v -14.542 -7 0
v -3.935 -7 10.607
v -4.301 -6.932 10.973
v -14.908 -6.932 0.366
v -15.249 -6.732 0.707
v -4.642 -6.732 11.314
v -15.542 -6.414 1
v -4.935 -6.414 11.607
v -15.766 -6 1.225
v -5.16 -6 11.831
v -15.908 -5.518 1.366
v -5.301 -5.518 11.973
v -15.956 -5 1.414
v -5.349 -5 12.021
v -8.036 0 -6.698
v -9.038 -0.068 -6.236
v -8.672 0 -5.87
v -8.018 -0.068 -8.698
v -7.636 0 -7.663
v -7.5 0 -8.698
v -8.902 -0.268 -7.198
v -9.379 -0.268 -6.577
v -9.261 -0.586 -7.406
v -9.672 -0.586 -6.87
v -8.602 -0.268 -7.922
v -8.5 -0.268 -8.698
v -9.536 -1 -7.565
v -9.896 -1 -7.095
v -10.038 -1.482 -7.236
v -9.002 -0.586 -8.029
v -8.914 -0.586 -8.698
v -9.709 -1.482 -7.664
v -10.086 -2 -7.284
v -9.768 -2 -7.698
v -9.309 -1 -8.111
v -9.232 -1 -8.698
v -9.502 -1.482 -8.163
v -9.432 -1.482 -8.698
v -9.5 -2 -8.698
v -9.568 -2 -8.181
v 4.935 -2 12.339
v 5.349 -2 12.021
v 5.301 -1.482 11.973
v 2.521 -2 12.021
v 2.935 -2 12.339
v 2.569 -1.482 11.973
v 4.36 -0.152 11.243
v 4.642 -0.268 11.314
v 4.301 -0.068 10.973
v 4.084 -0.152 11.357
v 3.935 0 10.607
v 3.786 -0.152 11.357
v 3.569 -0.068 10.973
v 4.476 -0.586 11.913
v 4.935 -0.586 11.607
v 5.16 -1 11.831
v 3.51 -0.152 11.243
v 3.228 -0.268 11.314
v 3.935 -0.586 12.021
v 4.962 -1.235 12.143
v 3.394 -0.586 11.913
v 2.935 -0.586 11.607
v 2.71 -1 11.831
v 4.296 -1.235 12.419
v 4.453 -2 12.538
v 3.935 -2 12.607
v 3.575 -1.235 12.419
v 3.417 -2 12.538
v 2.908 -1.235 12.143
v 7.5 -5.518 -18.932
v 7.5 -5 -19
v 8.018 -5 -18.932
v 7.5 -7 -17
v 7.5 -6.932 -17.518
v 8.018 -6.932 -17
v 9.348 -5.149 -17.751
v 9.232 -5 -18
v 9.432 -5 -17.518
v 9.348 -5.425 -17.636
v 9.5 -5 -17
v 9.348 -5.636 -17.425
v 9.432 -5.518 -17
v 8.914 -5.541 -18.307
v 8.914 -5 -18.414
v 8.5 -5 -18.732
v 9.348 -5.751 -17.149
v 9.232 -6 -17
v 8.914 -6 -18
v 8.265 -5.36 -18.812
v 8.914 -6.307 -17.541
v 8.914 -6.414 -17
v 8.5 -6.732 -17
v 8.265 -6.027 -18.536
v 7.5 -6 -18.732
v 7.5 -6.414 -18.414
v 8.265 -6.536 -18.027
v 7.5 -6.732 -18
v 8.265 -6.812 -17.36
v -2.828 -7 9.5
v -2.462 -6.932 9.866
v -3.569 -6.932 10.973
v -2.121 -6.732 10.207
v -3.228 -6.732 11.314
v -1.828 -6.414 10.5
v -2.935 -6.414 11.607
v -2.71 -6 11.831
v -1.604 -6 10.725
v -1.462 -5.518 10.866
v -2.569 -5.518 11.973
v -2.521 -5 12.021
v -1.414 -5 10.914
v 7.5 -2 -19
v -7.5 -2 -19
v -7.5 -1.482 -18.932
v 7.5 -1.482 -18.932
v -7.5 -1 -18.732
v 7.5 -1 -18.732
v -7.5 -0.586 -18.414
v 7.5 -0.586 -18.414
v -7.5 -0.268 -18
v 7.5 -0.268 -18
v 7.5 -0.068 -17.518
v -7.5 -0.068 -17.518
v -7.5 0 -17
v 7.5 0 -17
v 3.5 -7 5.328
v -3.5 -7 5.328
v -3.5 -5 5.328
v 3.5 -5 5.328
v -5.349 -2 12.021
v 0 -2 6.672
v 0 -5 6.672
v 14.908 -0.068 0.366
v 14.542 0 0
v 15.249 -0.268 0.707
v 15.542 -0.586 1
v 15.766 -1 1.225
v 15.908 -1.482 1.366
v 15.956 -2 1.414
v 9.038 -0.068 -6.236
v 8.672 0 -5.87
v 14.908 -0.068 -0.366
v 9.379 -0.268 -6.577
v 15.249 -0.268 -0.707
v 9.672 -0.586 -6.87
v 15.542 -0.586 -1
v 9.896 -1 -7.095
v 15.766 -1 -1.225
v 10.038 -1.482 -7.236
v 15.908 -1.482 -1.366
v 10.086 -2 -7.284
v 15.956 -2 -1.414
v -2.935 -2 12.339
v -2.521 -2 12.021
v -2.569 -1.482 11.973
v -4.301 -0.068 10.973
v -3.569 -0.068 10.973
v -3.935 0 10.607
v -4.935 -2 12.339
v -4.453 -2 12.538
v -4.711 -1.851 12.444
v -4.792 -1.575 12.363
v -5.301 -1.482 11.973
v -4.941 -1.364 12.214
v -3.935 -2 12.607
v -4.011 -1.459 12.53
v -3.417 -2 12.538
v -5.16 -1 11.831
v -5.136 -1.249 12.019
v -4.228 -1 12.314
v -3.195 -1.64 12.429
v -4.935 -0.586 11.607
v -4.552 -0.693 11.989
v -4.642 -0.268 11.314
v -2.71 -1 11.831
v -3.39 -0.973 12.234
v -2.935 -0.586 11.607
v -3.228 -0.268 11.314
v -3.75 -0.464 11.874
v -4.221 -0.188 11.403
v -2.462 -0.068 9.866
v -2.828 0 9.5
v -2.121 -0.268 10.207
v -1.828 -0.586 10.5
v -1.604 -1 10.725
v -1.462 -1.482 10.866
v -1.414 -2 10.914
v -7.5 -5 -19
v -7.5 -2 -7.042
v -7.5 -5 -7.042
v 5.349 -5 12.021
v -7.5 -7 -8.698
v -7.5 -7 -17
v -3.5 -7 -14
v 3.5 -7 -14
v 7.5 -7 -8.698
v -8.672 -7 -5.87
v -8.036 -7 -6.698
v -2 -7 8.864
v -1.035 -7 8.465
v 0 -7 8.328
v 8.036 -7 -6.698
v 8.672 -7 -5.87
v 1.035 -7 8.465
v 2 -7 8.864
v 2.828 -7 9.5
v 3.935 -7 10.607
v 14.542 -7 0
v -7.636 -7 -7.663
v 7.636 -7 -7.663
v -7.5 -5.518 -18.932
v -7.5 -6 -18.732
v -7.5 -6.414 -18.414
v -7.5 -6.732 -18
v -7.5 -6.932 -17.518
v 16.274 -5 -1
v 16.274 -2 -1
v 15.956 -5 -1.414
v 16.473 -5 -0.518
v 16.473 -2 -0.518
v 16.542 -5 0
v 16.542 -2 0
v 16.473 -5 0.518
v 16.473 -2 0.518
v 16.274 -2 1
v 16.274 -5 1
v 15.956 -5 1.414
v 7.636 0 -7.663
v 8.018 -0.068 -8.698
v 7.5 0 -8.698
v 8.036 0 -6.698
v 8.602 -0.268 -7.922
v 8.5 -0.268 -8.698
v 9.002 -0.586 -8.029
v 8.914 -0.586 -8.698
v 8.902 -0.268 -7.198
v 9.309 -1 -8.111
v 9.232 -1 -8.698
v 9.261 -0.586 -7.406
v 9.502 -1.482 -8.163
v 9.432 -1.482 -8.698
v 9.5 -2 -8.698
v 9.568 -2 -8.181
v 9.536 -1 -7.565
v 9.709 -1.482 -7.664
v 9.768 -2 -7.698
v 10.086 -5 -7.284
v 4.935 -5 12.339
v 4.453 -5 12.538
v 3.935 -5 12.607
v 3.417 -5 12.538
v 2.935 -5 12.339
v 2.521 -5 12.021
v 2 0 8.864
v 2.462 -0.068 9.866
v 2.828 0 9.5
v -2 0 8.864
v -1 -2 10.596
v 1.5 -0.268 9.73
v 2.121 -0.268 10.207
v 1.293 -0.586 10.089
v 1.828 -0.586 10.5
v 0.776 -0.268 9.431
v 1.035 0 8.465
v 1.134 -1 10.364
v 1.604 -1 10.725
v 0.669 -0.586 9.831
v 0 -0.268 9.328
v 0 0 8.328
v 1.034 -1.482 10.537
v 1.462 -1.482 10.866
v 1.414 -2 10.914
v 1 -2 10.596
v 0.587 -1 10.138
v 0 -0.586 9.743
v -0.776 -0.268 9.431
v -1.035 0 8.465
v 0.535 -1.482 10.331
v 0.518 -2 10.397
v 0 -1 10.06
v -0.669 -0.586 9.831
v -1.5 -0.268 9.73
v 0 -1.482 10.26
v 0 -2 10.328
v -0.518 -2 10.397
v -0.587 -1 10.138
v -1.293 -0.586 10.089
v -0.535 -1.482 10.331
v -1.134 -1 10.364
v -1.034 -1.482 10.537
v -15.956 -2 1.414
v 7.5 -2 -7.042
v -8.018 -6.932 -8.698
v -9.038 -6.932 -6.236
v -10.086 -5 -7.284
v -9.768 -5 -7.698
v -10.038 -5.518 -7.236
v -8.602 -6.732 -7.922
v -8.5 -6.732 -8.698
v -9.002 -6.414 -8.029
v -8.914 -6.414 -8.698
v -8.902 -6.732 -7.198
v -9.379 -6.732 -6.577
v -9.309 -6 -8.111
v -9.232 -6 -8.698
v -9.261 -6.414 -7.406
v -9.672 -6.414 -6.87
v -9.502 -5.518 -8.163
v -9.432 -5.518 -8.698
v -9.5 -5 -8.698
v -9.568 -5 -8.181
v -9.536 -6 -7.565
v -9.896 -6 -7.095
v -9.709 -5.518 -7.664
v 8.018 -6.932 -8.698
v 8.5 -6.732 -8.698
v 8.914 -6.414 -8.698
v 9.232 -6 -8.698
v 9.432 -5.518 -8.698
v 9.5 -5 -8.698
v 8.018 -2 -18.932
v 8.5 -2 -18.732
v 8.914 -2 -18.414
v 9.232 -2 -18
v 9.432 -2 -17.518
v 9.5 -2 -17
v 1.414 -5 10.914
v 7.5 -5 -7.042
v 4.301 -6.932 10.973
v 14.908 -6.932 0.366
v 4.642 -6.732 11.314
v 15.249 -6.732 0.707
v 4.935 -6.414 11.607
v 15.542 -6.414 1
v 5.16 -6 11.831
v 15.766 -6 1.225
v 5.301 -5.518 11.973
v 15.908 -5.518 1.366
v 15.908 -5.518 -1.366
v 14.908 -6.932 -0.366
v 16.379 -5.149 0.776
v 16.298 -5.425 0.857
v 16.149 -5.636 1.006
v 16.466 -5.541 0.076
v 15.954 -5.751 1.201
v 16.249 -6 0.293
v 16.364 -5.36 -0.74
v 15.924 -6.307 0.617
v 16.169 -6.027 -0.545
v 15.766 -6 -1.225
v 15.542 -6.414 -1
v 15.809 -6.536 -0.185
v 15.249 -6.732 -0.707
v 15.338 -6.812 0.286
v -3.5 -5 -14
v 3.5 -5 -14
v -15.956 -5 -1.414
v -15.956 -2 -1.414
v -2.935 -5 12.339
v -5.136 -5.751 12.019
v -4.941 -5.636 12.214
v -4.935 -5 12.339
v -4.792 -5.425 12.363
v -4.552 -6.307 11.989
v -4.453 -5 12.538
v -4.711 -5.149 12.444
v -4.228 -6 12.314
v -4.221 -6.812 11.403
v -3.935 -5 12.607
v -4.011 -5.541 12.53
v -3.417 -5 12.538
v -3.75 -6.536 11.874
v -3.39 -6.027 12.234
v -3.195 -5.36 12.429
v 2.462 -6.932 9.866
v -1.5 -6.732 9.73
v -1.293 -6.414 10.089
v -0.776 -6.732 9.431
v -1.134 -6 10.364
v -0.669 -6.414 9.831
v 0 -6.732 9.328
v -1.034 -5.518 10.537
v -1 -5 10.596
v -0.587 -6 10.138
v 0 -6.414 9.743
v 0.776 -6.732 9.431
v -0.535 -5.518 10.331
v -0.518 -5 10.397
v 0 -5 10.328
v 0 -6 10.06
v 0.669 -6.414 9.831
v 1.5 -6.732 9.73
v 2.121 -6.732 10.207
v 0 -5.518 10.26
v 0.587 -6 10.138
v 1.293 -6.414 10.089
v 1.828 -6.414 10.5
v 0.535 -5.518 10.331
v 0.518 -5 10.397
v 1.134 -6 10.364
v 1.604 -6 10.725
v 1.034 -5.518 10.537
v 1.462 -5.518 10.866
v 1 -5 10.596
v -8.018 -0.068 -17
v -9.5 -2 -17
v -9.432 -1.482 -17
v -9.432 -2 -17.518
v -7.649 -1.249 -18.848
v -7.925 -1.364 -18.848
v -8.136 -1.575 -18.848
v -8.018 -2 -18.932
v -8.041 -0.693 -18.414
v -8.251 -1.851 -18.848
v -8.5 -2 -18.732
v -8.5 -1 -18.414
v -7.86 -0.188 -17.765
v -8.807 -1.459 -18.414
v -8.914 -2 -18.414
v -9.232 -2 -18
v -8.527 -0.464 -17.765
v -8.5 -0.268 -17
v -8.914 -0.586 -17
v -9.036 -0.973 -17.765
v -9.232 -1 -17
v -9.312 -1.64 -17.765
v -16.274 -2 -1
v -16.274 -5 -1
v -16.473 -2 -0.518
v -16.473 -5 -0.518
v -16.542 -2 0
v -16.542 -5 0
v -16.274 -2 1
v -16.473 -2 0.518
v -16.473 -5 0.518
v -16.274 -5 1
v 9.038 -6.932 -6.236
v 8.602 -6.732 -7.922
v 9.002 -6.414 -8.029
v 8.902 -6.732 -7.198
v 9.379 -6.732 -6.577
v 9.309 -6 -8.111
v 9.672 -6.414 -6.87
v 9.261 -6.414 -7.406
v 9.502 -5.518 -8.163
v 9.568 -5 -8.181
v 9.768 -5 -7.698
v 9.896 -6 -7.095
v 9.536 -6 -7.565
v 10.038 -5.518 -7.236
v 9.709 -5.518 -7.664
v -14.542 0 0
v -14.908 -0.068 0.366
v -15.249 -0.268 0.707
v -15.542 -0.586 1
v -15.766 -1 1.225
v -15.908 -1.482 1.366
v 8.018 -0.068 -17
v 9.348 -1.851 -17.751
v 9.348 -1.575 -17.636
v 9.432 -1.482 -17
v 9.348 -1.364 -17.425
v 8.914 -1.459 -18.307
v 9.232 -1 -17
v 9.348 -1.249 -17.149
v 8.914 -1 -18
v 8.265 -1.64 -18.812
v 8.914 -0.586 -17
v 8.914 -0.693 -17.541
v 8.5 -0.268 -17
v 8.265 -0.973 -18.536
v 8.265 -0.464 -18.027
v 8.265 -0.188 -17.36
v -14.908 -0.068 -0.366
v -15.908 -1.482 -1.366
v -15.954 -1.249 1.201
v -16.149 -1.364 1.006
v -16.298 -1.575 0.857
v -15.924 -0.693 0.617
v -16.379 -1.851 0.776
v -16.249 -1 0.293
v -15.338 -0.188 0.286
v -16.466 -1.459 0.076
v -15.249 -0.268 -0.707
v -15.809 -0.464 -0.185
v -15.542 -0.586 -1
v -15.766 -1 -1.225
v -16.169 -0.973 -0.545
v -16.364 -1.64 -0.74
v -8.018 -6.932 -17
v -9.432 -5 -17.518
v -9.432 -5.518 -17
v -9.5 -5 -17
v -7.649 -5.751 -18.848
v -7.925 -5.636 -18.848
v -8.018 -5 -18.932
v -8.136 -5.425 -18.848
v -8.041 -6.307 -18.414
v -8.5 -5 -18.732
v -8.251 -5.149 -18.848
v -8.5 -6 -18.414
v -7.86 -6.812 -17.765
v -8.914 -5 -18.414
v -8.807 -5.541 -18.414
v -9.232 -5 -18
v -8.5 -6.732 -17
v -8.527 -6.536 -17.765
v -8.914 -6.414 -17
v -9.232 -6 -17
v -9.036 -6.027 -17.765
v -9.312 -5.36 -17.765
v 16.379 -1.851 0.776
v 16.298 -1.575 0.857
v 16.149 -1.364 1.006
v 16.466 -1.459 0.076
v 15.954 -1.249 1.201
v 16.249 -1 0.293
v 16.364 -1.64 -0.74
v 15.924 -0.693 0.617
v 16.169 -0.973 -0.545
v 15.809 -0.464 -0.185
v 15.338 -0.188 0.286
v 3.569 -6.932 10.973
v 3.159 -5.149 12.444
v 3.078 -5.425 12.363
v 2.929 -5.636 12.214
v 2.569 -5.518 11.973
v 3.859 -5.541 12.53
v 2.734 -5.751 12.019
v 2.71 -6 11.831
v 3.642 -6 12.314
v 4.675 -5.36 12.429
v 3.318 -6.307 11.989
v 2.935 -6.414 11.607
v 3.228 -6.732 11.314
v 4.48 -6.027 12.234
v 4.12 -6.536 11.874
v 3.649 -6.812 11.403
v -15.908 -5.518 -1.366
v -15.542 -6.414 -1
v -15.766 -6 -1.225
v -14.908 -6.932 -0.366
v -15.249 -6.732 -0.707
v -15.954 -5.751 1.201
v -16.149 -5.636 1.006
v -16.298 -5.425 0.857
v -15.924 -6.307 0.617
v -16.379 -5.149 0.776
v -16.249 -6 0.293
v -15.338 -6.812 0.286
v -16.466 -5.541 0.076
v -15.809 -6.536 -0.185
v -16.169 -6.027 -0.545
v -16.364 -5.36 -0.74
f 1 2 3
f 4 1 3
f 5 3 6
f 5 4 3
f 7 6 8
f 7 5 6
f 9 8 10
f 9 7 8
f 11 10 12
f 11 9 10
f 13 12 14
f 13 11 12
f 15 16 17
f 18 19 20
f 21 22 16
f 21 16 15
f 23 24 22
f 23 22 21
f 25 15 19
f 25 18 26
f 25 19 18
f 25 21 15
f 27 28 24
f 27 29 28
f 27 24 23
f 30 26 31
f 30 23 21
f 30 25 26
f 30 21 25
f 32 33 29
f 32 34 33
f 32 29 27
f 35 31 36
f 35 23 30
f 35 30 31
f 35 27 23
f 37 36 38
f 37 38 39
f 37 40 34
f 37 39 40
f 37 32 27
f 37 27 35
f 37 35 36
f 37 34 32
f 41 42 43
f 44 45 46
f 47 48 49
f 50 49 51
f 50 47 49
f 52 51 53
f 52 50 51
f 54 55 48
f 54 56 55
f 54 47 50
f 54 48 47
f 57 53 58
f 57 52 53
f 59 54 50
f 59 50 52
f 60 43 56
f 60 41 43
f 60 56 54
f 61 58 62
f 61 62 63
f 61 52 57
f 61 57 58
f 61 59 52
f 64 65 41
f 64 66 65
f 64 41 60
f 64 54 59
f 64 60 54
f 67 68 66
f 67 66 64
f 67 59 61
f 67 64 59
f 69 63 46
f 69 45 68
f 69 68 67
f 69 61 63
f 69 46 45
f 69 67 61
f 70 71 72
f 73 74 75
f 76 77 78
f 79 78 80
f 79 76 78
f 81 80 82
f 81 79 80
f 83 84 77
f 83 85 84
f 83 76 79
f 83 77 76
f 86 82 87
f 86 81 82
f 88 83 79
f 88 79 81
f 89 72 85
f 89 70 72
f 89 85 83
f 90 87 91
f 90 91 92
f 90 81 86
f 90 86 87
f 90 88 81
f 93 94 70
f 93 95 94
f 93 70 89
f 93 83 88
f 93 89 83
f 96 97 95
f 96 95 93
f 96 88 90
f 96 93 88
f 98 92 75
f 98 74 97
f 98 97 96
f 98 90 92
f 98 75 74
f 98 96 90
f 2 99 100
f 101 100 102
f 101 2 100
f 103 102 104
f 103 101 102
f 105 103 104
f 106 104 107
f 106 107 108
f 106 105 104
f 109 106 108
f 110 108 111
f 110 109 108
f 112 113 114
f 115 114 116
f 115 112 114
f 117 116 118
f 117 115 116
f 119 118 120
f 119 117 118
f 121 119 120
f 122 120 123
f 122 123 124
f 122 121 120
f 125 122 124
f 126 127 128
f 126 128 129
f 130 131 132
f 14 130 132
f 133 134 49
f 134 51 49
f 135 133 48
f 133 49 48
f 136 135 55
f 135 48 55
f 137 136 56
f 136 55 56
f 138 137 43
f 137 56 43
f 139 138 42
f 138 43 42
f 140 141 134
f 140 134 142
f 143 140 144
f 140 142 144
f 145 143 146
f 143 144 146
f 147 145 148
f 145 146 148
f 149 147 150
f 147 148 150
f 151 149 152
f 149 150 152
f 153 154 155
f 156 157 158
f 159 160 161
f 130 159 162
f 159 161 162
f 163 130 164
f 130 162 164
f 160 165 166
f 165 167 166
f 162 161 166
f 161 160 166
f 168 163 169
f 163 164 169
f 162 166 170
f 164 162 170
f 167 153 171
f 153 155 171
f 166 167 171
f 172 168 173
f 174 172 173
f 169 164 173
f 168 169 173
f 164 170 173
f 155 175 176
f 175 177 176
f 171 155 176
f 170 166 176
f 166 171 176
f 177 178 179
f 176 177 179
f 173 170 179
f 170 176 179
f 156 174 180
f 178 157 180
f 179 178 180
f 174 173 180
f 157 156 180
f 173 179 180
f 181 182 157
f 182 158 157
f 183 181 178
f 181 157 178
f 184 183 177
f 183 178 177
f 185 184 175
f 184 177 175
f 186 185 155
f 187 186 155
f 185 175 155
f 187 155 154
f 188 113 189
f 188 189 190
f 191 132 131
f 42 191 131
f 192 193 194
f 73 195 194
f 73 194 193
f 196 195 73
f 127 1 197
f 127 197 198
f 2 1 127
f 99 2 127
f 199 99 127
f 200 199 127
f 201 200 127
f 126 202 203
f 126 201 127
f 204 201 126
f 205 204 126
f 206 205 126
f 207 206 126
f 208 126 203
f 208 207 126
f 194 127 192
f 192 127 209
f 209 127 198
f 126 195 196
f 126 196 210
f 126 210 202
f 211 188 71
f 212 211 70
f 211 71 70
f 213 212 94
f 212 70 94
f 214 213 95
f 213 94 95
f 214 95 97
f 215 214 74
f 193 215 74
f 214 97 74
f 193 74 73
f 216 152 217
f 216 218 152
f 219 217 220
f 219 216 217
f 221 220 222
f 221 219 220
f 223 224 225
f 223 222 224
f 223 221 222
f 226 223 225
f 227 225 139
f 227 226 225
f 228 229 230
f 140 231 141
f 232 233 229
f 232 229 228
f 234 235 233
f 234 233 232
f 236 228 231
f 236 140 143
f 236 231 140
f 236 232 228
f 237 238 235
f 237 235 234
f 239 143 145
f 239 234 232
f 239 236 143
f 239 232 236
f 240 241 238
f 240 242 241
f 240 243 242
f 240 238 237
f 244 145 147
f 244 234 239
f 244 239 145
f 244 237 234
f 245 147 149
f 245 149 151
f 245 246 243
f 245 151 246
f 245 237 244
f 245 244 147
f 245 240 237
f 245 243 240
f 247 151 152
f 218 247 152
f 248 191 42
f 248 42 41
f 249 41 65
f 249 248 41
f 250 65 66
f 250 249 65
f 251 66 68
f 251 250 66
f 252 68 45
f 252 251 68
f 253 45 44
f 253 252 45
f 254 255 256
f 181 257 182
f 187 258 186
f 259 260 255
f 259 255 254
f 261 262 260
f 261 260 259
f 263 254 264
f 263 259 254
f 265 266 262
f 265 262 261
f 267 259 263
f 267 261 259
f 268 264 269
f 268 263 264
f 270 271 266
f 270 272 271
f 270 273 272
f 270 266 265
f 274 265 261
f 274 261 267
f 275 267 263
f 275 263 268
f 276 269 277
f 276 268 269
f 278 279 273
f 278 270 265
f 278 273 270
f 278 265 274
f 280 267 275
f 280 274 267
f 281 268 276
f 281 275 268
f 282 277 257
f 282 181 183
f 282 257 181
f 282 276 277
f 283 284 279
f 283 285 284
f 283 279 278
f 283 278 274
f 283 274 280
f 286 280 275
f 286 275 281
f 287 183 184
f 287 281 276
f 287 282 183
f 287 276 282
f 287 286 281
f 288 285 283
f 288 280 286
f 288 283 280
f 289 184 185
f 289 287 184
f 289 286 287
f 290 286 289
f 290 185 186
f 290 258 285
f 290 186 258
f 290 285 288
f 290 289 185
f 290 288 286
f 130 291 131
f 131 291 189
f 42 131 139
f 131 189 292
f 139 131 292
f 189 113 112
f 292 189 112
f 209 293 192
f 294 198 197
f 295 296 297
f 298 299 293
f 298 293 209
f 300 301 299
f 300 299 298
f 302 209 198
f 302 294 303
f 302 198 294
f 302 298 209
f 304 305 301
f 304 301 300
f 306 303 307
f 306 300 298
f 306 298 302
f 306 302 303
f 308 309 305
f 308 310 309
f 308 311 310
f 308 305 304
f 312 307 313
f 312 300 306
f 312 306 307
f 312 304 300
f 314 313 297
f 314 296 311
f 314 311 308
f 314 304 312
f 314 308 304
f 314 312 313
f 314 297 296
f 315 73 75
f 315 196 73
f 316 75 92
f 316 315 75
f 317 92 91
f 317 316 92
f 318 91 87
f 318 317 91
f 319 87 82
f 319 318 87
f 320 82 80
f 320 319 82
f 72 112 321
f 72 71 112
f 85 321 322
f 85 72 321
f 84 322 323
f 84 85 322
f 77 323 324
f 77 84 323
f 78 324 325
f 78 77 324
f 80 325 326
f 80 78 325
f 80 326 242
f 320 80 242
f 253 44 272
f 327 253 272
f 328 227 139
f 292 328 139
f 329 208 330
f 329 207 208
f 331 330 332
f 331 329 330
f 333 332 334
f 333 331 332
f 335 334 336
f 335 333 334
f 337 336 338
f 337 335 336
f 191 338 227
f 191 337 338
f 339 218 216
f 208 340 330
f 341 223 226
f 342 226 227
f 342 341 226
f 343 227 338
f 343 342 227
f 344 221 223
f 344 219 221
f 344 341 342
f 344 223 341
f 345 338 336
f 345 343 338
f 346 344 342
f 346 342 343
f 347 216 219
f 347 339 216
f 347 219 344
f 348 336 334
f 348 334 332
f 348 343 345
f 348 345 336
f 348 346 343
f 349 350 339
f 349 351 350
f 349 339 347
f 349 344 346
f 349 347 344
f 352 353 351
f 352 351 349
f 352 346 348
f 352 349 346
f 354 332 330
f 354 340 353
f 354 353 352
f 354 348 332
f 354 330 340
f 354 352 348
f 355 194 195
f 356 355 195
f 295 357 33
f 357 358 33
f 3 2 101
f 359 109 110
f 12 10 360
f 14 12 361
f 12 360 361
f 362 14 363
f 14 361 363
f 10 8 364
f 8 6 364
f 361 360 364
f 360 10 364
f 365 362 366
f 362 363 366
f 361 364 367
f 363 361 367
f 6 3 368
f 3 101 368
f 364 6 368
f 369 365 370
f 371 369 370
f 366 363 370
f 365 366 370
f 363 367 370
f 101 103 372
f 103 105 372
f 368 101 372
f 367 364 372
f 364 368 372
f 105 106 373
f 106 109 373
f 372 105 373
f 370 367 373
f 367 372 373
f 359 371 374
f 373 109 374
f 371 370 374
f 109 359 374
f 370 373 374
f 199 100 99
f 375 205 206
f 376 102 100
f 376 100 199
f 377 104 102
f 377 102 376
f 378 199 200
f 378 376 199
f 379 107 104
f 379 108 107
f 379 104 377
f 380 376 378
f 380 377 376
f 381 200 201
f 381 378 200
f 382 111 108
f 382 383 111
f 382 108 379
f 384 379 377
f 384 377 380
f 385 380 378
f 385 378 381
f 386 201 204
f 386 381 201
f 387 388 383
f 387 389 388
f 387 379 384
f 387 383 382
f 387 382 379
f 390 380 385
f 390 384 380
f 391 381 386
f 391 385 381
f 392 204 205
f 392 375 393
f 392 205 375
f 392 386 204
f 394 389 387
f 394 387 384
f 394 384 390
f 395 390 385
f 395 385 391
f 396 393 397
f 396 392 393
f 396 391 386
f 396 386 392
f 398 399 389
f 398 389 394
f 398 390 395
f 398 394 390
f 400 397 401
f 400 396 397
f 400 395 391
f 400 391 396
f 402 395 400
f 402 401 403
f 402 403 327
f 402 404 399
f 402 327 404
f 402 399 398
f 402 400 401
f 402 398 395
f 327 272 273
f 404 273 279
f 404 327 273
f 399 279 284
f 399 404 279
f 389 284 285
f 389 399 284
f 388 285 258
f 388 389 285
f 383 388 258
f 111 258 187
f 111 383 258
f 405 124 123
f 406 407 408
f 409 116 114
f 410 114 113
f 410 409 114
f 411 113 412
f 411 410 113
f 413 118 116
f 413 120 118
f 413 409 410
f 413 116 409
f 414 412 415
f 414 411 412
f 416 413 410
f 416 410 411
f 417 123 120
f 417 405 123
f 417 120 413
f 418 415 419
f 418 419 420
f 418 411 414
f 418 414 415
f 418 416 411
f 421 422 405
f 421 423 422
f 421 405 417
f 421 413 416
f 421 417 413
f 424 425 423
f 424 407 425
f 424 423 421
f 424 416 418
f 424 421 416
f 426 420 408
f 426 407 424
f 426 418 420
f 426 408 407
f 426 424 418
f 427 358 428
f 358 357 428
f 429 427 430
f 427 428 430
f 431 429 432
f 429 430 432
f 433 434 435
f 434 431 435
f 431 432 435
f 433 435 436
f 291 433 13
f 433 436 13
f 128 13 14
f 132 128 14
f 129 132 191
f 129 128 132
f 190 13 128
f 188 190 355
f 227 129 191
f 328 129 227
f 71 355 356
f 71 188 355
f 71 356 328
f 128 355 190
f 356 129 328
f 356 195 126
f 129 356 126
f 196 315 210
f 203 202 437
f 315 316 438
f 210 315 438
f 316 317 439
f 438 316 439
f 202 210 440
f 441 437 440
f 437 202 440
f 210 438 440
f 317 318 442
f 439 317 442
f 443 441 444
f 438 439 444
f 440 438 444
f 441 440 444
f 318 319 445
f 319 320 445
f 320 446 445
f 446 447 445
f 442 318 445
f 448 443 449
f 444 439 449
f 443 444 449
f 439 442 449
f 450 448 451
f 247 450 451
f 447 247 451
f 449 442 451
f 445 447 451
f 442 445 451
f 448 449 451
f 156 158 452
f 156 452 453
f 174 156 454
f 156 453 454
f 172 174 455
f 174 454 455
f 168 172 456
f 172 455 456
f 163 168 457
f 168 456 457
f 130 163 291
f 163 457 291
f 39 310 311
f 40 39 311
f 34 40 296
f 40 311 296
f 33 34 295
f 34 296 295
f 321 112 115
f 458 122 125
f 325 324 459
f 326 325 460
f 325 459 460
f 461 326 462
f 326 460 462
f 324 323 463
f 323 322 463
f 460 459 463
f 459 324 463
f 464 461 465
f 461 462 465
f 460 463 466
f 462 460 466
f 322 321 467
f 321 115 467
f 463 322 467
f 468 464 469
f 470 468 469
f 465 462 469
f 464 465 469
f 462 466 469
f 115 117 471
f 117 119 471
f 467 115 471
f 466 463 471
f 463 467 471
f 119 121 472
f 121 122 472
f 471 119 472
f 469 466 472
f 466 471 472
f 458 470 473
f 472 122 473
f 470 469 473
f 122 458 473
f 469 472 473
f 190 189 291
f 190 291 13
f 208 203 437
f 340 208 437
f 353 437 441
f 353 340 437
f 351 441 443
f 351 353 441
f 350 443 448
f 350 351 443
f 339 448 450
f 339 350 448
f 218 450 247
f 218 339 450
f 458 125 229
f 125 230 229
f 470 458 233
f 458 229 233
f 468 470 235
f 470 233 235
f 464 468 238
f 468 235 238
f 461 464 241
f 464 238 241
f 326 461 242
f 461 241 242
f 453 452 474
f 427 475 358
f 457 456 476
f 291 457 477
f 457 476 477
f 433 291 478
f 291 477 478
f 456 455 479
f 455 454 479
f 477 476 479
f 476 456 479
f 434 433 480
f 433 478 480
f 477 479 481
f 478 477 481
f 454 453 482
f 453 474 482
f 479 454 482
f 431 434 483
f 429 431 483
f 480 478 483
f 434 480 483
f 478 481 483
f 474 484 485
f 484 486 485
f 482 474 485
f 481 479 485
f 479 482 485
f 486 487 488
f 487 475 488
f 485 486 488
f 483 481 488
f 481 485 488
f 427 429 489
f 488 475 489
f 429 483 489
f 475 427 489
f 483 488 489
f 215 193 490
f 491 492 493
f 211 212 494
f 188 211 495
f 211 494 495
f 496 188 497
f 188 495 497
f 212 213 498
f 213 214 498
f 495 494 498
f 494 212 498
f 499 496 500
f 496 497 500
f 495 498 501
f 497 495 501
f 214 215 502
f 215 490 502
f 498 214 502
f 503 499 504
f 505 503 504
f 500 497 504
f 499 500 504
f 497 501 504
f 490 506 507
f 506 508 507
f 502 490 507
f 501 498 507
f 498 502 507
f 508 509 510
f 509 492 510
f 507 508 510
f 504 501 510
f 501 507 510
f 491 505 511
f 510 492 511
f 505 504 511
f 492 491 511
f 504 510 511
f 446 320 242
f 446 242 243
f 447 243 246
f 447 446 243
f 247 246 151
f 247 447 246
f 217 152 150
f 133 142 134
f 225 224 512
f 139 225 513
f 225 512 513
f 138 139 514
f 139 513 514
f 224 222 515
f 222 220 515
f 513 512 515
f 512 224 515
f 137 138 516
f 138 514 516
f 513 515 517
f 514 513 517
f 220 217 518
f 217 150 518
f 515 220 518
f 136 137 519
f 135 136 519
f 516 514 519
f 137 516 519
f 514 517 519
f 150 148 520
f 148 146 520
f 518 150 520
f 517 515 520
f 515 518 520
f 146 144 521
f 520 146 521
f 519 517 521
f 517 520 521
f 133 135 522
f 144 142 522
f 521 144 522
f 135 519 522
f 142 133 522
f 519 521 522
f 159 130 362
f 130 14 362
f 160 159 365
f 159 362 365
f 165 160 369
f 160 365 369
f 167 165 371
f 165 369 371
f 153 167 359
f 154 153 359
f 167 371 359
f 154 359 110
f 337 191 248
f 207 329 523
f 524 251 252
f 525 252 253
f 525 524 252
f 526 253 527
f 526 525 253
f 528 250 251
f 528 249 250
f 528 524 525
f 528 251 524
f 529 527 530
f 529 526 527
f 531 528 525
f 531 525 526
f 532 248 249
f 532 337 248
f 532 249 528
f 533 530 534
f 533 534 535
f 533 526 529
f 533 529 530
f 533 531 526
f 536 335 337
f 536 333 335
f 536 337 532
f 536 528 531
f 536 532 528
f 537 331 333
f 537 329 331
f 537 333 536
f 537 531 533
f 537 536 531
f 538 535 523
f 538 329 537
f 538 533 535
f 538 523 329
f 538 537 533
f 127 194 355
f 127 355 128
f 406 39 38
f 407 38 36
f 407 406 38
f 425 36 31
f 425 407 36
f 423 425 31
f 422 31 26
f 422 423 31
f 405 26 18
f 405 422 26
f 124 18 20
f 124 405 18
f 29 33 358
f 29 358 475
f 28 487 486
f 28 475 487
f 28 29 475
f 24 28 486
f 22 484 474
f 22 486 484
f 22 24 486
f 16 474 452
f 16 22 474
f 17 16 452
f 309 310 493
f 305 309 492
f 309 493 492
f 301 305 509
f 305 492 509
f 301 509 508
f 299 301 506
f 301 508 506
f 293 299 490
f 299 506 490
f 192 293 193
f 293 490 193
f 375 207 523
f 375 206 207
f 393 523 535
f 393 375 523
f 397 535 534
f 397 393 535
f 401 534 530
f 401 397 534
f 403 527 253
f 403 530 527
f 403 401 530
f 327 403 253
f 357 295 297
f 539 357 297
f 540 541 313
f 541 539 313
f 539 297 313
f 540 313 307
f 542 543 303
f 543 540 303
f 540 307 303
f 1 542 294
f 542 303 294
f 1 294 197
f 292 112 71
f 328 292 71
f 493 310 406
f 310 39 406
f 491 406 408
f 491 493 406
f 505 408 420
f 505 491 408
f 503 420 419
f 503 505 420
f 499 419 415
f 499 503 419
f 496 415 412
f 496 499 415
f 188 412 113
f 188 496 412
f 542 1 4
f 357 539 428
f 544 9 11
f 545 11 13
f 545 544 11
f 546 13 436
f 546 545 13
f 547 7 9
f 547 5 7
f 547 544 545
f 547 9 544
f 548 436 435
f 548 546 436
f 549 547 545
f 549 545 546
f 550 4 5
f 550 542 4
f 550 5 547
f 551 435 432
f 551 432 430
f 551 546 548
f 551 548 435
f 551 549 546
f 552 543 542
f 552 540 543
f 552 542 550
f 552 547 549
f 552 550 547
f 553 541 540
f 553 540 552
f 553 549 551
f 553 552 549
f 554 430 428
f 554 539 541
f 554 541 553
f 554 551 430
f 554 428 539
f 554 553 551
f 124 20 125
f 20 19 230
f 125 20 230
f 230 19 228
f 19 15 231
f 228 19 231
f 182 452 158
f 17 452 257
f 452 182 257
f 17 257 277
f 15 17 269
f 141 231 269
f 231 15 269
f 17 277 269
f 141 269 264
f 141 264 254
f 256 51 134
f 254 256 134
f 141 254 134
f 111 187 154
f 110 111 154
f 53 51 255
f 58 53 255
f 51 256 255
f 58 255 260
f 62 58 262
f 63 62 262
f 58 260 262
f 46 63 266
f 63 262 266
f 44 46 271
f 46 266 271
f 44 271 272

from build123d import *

# Parameters (mm, degrees)
F1_DEPTH  = 7
F2_W      = 15
F2_H      = 3
F3_DEPTH  = 25
F4_W      = 15
F4_H      = 3
F5_DEPTH  = 19.6
F6_W      = 3
F6_H      = 15
F7_DEPTH  = 21.3
F8_R      = 1.99999
F9_W      = 7
F9_H      = 19.3284271247
F10_DEPTH = 2


# Not quite as in the source:
# - a fillet or chamfer is up to 0.001 mm smaller than in the source, because OpenCascade refuses the exact size


with BuildPart() as f1:
    # F0 (on Front) → F1 (new body)
    with BuildSketch(Plane.XZ):
        Polygon((0, 9.5), (-9.5, 0), (9.5, 0), align=None)
        Polygon((9.5, 0), (-9.5, 0), (-9.5, -7.8700576851), (-9.5, -19), (9.5, -19), (9.5, -7.8700576851), align=None)
        Polygon((-9.5, -7.8700576851), (-9.5, 0), (0, 9.5), (-3.9350288425, 13.4350288425), (-17.3700576851, 0), align=None)
        Polygon((0, 9.5), (9.5, 0), (9.5, -7.8700576851), (17.3700576851, 0), (3.9350288425, 13.4350288425), align=None)
    extrude(amount=F1_DEPTH)

    # F2 (on face) → F3 (cut)
    with BuildSketch(Plane(origin=(0, 0, -19), x_dir=(1, 0, 0), z_dir=(0, 0, -1))):
        with Locations((0, 3.5)):
            Rectangle(F2_W, F2_H)
    extrude(amount=-F3_DEPTH, mode=Mode.SUBTRACT)

    # F4 (on face) → F5 (cut)
    with BuildSketch(Plane(origin=(8.6850288425, 0, 8.6850288425), x_dir=(0.7071067812, 0, -0.7071067812), z_dir=(0.7071067812, 0, 0.7071067812))):
        with Locations((2.7824855787, -3.5)):
            Rectangle(F4_W, F4_H)
    extrude(amount=-F5_DEPTH, mode=Mode.SUBTRACT)

    # F6 (on face) → F7 (cut)
    with BuildSketch(Plane(origin=(-8.6850288425, 0, 8.6850288425), x_dir=(0, -1, 0), z_dir=(-0.7071067812, 0, 0.7071067812))):
        with Locations((3.5, -2.7824855787)):
            Rectangle(F6_W, F6_H)
    extrude(amount=-F7_DEPTH, mode=Mode.SUBTRACT)

    # F8 (radius 2 in the source; OpenCascade refuses exactly that, so slightly less here)
    f8_edges = [f1.edges().sort_by_distance(p)[0] for p in [
        (-9.5, -7, -13.435029),
        (-13.435029, -7, -3.935029),
        (-13.435029, 0, -3.935029),
        (-9.5, 0, -13.435029),
        (0, -7, -19),
        (0, 0, -19),
        (-9.5, -3.5, -19),
        (9.5, -3.5, -19),
        (9.5, -7, -13.435029),
        (9.5, 0, -13.435029),
        (13.435029, 0, -3.935029),
        (13.435029, -7, -3.935029),
        (17.370058, -3.5, 0),
        (10.652543, -7, 6.717514),
        (3.935029, -3.5, 13.435029),
        (10.652543, 0, 6.717514),
        (1.967514, 0, 11.467514),
        (-1.967514, 0, 11.467514),
        (-1.967514, -7, 11.467514),
        (1.967514, -7, 11.467514),
        (-10.652543, -7, 6.717514),
        (-3.935029, -3.5, 13.435029),
        (-10.652543, 0, 6.717514),
        (-17.370058, -3.5, 0),
        (0, -3.5, 9.5),
        (-9.5, -3.5, -7.870058),
        (9.5, -3.5, -7.870058),
    ]]
    fillet(f8_edges, radius=F8_R)

    # F9 (on face) → F10 (cut)
    with BuildSketch(Plane.XZ.offset(7)):
        with Locations((0, -4.3357864376)):
            Rectangle(F9_W, F9_H)
    extrude(amount=-F10_DEPTH, mode=Mode.SUBTRACT)


solid = f1.part
